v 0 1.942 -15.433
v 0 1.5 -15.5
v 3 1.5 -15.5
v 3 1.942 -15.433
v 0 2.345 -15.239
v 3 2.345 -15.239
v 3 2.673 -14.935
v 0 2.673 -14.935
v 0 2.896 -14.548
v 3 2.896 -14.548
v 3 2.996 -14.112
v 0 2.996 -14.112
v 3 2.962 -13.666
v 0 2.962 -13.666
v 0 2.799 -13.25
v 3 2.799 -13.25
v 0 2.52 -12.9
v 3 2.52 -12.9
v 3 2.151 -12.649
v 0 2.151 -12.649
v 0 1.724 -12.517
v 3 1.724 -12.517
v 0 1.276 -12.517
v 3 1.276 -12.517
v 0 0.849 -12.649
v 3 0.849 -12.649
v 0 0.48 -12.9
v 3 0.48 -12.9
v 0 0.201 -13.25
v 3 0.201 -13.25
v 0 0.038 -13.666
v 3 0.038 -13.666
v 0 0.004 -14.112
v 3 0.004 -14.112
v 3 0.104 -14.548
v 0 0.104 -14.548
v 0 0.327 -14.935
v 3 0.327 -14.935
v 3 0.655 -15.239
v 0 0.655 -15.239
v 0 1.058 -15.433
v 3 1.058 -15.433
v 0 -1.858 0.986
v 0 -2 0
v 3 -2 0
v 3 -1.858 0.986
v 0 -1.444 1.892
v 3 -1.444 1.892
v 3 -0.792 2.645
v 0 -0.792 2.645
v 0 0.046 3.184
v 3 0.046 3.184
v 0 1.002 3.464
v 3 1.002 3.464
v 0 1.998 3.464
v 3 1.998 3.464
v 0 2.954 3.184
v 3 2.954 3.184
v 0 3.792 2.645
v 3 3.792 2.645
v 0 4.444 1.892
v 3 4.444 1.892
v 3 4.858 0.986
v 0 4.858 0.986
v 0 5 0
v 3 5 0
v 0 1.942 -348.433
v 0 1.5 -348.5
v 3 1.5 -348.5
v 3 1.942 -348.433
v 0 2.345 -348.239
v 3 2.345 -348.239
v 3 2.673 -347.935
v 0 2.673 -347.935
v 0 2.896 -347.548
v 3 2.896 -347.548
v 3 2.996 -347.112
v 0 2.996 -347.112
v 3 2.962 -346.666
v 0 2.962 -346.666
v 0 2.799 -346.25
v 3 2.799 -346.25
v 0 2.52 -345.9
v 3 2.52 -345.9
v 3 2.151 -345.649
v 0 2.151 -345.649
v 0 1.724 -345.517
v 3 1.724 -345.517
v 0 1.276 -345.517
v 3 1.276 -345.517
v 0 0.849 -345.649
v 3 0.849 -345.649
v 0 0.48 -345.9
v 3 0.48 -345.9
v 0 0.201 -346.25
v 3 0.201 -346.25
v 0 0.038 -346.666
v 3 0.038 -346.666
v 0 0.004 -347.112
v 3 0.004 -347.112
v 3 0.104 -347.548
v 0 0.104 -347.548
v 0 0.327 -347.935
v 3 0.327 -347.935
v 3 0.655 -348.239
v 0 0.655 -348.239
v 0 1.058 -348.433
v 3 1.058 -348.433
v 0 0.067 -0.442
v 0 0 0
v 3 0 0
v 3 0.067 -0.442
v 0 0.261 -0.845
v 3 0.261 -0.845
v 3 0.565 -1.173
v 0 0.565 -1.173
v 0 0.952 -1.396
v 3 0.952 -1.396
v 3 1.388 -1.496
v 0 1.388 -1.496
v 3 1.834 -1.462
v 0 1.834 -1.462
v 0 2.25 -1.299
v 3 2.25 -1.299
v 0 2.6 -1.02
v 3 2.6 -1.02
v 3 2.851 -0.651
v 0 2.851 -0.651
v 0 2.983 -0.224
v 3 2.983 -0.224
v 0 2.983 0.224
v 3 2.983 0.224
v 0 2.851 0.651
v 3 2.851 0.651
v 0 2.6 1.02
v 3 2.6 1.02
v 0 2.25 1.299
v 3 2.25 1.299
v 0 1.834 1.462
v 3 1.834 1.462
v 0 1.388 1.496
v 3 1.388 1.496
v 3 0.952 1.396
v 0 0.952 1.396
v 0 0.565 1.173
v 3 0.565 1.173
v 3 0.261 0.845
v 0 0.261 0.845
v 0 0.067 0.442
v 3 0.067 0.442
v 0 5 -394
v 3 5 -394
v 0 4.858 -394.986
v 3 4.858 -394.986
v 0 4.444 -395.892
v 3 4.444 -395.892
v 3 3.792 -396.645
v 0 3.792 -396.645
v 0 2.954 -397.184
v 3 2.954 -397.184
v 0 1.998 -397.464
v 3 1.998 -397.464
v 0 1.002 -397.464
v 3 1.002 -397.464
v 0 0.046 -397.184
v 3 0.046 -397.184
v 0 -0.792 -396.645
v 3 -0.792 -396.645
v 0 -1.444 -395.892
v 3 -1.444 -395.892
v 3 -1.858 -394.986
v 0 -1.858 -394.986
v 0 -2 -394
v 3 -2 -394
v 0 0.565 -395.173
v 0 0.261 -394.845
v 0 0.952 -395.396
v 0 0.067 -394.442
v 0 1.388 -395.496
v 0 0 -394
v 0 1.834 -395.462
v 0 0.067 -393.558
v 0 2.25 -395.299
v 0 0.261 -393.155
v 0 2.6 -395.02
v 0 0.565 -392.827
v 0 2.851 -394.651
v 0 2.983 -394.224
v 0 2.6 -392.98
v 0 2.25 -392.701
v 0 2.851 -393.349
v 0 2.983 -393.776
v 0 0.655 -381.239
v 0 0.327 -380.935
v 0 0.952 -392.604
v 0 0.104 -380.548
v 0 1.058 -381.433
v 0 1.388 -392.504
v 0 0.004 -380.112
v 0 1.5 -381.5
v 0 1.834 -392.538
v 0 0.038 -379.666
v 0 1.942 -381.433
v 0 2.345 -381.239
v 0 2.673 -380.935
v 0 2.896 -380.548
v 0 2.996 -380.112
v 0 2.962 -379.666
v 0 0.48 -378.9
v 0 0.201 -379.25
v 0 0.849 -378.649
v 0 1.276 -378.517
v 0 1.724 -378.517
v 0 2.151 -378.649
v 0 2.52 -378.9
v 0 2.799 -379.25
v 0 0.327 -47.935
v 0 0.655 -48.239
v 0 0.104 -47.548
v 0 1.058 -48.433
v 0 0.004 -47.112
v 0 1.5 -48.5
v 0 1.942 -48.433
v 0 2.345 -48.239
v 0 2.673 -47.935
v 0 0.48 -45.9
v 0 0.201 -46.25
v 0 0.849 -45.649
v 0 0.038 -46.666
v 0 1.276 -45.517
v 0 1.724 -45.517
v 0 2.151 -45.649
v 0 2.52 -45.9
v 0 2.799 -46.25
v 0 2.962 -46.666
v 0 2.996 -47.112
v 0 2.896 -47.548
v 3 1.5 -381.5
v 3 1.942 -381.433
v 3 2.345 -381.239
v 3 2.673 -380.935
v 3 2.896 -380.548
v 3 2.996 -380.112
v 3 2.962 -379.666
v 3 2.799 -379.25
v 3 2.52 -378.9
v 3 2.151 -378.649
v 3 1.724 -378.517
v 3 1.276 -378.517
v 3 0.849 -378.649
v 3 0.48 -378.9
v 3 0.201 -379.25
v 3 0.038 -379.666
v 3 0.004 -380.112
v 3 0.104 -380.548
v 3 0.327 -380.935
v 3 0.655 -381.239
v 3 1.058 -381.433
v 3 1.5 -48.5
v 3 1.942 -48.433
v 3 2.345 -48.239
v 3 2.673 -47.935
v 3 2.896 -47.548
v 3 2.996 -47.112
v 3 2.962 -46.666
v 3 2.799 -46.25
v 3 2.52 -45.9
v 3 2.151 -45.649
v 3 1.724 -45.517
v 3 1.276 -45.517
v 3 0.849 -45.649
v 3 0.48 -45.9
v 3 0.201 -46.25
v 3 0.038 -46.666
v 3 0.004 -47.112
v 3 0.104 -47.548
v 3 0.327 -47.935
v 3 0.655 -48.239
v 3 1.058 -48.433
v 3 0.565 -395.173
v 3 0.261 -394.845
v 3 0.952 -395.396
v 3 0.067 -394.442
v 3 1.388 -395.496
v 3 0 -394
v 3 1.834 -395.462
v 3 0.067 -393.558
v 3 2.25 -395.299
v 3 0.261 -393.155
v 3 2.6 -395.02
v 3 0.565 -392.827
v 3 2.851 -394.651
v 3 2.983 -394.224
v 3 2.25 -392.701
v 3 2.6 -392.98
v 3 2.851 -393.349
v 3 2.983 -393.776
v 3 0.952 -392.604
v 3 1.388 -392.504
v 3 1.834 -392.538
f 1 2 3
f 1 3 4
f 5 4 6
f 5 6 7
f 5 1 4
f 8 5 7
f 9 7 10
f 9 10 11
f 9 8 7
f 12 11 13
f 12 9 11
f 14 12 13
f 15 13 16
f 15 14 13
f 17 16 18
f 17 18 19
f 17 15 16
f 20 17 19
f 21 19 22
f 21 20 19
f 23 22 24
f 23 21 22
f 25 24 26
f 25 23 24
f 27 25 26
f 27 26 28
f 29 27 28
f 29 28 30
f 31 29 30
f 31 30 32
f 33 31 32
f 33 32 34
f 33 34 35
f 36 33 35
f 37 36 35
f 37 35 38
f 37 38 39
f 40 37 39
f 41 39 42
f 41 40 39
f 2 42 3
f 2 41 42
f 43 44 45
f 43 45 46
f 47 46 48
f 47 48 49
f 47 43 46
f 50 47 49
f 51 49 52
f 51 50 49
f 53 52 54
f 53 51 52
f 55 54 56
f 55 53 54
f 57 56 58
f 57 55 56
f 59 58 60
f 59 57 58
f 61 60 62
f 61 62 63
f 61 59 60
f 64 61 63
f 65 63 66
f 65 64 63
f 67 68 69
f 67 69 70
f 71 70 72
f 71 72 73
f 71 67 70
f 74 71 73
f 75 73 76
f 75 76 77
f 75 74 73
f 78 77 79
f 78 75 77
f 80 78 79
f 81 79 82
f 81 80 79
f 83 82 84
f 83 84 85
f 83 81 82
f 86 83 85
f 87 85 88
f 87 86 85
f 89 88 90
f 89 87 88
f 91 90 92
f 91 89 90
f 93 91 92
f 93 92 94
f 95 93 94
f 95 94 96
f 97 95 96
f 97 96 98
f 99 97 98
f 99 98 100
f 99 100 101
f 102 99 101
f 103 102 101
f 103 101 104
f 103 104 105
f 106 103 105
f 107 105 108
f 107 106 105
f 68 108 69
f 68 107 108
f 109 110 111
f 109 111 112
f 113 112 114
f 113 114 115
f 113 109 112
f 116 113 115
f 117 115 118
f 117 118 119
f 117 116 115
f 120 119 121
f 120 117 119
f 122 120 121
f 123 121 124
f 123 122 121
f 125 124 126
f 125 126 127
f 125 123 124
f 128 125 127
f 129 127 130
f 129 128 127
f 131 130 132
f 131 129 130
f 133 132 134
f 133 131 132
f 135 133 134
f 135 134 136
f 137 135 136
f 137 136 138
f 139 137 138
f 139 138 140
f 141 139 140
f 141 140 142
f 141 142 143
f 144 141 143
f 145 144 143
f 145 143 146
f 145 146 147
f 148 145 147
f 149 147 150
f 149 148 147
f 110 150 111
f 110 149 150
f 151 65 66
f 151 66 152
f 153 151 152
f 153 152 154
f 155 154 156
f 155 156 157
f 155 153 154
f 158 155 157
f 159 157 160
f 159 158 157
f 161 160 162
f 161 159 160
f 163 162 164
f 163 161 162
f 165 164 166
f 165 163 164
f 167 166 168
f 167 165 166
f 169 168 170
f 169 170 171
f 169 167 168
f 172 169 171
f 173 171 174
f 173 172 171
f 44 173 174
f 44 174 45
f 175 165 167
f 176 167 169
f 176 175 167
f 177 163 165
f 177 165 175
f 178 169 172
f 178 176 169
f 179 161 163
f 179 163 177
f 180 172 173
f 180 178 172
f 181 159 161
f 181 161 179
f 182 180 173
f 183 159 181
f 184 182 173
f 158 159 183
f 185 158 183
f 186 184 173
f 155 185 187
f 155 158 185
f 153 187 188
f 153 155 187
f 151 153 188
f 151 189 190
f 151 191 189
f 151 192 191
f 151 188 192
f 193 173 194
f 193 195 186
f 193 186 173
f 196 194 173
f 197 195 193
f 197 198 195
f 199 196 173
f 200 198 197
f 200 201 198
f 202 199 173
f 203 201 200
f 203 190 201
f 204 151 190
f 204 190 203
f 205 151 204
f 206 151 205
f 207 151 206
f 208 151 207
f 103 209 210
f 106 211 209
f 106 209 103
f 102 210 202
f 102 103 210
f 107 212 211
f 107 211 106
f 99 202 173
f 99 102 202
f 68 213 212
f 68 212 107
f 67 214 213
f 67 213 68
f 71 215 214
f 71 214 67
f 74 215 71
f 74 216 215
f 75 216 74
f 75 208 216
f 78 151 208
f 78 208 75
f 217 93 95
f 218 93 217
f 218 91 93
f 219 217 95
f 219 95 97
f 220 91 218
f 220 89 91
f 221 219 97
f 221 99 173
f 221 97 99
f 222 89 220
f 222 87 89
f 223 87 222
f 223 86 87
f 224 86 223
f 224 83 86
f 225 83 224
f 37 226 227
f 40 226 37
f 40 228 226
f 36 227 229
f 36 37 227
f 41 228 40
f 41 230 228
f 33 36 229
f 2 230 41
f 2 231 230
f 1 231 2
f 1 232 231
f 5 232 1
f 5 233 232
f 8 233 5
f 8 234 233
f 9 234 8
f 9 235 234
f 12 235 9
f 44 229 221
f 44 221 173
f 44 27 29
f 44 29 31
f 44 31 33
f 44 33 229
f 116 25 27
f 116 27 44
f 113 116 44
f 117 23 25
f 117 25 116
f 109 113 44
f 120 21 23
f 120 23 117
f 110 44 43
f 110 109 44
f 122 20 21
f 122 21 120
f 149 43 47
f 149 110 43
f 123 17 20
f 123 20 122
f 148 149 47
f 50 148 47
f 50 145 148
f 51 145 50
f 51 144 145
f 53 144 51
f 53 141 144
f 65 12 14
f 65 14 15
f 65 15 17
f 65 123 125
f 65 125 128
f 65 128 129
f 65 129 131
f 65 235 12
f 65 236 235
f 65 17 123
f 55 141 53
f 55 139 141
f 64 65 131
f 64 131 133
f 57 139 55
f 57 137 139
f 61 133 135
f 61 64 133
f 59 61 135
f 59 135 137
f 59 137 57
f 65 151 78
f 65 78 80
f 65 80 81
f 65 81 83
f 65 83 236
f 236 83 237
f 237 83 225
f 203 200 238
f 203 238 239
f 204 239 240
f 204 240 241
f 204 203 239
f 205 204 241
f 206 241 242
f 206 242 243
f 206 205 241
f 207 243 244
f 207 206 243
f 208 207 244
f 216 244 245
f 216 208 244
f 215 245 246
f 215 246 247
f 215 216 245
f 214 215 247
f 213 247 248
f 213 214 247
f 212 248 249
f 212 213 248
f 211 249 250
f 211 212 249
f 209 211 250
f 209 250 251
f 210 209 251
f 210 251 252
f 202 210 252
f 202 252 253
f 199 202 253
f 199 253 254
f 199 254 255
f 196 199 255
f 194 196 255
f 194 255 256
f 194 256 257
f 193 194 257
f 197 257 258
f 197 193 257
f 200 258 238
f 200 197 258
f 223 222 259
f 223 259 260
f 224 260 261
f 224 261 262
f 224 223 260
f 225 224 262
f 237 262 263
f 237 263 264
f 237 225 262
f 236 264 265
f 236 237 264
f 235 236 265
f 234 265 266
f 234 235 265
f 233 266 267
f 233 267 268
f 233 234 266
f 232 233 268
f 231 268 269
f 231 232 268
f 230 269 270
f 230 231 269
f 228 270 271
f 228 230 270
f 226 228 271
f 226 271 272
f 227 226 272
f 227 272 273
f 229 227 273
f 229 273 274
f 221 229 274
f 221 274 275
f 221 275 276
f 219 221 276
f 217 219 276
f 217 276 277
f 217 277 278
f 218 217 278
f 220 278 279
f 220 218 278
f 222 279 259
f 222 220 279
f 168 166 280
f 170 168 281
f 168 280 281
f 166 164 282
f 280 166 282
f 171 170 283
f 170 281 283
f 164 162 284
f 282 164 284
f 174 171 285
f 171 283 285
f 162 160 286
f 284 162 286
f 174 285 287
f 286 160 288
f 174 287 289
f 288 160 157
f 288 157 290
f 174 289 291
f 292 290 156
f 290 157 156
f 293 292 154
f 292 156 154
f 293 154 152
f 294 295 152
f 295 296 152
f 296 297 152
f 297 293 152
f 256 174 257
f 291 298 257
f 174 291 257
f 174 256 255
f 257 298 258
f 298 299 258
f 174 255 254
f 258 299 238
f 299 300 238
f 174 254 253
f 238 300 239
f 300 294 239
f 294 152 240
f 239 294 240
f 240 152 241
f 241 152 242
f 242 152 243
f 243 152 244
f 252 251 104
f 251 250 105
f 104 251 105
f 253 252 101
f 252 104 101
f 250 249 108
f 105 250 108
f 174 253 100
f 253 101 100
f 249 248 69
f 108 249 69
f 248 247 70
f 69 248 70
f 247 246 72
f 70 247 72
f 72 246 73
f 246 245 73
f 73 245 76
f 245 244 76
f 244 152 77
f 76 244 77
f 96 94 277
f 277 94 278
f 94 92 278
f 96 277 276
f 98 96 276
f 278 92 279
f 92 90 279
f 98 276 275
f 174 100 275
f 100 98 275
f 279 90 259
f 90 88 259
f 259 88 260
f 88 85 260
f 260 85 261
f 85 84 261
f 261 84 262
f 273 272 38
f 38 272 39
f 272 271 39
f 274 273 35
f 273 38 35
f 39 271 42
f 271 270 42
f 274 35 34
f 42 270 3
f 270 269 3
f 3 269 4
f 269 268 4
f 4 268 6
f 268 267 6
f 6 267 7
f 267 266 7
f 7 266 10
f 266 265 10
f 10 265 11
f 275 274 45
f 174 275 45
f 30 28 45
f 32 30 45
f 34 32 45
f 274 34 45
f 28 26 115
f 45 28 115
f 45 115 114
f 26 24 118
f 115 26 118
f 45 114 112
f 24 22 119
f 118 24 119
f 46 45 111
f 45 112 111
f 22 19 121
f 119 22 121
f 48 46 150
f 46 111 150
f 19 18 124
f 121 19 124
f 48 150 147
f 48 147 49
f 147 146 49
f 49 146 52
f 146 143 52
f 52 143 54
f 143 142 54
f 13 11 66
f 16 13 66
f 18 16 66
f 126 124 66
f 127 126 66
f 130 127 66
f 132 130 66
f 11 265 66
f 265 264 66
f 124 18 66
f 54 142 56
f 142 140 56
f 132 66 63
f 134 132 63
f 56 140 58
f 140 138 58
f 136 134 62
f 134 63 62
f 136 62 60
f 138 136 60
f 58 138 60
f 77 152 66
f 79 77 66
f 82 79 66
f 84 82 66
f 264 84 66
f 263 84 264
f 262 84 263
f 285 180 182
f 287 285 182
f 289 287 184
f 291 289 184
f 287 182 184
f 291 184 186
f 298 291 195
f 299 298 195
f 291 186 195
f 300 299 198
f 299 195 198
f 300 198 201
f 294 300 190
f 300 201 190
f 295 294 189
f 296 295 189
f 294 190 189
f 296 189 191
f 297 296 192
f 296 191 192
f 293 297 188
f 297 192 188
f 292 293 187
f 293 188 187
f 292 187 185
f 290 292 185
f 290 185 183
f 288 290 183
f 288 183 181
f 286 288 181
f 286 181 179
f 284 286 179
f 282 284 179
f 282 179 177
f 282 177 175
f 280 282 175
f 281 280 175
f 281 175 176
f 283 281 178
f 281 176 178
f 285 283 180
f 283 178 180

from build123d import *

# Parameters (mm, degrees)
SKETCH_1_R      = 1.5
EXTRUDE_1_DEPTH = 3


with BuildPart() as part:
    # 草图1 → 凸台-拉伸1 (new body)
    with BuildSketch(Plane(origin=(0, 0, 0), x_dir=(0, 0, -1), z_dir=(1, 0, 0))):
        with BuildLine():
            Line((0, 5), (394, 5))
            ThreePointArc((394, 5), (397.5, 1.5), (394, -2))
            Line((394, -2), (0, -2))
            ThreePointArc((0, -2), (-3.5, 1.5), (0, 5))
        make_face()
        with Locations((14, 1.5)):
            Circle(SKETCH_1_R, mode=Mode.SUBTRACT)
        with Locations((380, 1.5)):
            Circle(SKETCH_1_R, mode=Mode.SUBTRACT)
        with Locations((47, 1.5)):
            Circle(SKETCH_1_R, mode=Mode.SUBTRACT)
        with Locations((347, 1.5)):
            Circle(SKETCH_1_R, mode=Mode.SUBTRACT)
        with BuildLine():
            ThreePointArc((0, 3), (-1.5, 1.5), (0, 0))
            ThreePointArc((0, 0), (1.5, 1.5), (0, 3))
        make_face(mode=Mode.SUBTRACT)
        with BuildLine():
            ThreePointArc((394, 3), (395.5, 1.5), (394, 0))
            ThreePointArc((394, 0), (392.5, 1.5), (394, 3))
        make_face(mode=Mode.SUBTRACT)
    extrude(amount=EXTRUDE_1_DEPTH)


solid = part.part
